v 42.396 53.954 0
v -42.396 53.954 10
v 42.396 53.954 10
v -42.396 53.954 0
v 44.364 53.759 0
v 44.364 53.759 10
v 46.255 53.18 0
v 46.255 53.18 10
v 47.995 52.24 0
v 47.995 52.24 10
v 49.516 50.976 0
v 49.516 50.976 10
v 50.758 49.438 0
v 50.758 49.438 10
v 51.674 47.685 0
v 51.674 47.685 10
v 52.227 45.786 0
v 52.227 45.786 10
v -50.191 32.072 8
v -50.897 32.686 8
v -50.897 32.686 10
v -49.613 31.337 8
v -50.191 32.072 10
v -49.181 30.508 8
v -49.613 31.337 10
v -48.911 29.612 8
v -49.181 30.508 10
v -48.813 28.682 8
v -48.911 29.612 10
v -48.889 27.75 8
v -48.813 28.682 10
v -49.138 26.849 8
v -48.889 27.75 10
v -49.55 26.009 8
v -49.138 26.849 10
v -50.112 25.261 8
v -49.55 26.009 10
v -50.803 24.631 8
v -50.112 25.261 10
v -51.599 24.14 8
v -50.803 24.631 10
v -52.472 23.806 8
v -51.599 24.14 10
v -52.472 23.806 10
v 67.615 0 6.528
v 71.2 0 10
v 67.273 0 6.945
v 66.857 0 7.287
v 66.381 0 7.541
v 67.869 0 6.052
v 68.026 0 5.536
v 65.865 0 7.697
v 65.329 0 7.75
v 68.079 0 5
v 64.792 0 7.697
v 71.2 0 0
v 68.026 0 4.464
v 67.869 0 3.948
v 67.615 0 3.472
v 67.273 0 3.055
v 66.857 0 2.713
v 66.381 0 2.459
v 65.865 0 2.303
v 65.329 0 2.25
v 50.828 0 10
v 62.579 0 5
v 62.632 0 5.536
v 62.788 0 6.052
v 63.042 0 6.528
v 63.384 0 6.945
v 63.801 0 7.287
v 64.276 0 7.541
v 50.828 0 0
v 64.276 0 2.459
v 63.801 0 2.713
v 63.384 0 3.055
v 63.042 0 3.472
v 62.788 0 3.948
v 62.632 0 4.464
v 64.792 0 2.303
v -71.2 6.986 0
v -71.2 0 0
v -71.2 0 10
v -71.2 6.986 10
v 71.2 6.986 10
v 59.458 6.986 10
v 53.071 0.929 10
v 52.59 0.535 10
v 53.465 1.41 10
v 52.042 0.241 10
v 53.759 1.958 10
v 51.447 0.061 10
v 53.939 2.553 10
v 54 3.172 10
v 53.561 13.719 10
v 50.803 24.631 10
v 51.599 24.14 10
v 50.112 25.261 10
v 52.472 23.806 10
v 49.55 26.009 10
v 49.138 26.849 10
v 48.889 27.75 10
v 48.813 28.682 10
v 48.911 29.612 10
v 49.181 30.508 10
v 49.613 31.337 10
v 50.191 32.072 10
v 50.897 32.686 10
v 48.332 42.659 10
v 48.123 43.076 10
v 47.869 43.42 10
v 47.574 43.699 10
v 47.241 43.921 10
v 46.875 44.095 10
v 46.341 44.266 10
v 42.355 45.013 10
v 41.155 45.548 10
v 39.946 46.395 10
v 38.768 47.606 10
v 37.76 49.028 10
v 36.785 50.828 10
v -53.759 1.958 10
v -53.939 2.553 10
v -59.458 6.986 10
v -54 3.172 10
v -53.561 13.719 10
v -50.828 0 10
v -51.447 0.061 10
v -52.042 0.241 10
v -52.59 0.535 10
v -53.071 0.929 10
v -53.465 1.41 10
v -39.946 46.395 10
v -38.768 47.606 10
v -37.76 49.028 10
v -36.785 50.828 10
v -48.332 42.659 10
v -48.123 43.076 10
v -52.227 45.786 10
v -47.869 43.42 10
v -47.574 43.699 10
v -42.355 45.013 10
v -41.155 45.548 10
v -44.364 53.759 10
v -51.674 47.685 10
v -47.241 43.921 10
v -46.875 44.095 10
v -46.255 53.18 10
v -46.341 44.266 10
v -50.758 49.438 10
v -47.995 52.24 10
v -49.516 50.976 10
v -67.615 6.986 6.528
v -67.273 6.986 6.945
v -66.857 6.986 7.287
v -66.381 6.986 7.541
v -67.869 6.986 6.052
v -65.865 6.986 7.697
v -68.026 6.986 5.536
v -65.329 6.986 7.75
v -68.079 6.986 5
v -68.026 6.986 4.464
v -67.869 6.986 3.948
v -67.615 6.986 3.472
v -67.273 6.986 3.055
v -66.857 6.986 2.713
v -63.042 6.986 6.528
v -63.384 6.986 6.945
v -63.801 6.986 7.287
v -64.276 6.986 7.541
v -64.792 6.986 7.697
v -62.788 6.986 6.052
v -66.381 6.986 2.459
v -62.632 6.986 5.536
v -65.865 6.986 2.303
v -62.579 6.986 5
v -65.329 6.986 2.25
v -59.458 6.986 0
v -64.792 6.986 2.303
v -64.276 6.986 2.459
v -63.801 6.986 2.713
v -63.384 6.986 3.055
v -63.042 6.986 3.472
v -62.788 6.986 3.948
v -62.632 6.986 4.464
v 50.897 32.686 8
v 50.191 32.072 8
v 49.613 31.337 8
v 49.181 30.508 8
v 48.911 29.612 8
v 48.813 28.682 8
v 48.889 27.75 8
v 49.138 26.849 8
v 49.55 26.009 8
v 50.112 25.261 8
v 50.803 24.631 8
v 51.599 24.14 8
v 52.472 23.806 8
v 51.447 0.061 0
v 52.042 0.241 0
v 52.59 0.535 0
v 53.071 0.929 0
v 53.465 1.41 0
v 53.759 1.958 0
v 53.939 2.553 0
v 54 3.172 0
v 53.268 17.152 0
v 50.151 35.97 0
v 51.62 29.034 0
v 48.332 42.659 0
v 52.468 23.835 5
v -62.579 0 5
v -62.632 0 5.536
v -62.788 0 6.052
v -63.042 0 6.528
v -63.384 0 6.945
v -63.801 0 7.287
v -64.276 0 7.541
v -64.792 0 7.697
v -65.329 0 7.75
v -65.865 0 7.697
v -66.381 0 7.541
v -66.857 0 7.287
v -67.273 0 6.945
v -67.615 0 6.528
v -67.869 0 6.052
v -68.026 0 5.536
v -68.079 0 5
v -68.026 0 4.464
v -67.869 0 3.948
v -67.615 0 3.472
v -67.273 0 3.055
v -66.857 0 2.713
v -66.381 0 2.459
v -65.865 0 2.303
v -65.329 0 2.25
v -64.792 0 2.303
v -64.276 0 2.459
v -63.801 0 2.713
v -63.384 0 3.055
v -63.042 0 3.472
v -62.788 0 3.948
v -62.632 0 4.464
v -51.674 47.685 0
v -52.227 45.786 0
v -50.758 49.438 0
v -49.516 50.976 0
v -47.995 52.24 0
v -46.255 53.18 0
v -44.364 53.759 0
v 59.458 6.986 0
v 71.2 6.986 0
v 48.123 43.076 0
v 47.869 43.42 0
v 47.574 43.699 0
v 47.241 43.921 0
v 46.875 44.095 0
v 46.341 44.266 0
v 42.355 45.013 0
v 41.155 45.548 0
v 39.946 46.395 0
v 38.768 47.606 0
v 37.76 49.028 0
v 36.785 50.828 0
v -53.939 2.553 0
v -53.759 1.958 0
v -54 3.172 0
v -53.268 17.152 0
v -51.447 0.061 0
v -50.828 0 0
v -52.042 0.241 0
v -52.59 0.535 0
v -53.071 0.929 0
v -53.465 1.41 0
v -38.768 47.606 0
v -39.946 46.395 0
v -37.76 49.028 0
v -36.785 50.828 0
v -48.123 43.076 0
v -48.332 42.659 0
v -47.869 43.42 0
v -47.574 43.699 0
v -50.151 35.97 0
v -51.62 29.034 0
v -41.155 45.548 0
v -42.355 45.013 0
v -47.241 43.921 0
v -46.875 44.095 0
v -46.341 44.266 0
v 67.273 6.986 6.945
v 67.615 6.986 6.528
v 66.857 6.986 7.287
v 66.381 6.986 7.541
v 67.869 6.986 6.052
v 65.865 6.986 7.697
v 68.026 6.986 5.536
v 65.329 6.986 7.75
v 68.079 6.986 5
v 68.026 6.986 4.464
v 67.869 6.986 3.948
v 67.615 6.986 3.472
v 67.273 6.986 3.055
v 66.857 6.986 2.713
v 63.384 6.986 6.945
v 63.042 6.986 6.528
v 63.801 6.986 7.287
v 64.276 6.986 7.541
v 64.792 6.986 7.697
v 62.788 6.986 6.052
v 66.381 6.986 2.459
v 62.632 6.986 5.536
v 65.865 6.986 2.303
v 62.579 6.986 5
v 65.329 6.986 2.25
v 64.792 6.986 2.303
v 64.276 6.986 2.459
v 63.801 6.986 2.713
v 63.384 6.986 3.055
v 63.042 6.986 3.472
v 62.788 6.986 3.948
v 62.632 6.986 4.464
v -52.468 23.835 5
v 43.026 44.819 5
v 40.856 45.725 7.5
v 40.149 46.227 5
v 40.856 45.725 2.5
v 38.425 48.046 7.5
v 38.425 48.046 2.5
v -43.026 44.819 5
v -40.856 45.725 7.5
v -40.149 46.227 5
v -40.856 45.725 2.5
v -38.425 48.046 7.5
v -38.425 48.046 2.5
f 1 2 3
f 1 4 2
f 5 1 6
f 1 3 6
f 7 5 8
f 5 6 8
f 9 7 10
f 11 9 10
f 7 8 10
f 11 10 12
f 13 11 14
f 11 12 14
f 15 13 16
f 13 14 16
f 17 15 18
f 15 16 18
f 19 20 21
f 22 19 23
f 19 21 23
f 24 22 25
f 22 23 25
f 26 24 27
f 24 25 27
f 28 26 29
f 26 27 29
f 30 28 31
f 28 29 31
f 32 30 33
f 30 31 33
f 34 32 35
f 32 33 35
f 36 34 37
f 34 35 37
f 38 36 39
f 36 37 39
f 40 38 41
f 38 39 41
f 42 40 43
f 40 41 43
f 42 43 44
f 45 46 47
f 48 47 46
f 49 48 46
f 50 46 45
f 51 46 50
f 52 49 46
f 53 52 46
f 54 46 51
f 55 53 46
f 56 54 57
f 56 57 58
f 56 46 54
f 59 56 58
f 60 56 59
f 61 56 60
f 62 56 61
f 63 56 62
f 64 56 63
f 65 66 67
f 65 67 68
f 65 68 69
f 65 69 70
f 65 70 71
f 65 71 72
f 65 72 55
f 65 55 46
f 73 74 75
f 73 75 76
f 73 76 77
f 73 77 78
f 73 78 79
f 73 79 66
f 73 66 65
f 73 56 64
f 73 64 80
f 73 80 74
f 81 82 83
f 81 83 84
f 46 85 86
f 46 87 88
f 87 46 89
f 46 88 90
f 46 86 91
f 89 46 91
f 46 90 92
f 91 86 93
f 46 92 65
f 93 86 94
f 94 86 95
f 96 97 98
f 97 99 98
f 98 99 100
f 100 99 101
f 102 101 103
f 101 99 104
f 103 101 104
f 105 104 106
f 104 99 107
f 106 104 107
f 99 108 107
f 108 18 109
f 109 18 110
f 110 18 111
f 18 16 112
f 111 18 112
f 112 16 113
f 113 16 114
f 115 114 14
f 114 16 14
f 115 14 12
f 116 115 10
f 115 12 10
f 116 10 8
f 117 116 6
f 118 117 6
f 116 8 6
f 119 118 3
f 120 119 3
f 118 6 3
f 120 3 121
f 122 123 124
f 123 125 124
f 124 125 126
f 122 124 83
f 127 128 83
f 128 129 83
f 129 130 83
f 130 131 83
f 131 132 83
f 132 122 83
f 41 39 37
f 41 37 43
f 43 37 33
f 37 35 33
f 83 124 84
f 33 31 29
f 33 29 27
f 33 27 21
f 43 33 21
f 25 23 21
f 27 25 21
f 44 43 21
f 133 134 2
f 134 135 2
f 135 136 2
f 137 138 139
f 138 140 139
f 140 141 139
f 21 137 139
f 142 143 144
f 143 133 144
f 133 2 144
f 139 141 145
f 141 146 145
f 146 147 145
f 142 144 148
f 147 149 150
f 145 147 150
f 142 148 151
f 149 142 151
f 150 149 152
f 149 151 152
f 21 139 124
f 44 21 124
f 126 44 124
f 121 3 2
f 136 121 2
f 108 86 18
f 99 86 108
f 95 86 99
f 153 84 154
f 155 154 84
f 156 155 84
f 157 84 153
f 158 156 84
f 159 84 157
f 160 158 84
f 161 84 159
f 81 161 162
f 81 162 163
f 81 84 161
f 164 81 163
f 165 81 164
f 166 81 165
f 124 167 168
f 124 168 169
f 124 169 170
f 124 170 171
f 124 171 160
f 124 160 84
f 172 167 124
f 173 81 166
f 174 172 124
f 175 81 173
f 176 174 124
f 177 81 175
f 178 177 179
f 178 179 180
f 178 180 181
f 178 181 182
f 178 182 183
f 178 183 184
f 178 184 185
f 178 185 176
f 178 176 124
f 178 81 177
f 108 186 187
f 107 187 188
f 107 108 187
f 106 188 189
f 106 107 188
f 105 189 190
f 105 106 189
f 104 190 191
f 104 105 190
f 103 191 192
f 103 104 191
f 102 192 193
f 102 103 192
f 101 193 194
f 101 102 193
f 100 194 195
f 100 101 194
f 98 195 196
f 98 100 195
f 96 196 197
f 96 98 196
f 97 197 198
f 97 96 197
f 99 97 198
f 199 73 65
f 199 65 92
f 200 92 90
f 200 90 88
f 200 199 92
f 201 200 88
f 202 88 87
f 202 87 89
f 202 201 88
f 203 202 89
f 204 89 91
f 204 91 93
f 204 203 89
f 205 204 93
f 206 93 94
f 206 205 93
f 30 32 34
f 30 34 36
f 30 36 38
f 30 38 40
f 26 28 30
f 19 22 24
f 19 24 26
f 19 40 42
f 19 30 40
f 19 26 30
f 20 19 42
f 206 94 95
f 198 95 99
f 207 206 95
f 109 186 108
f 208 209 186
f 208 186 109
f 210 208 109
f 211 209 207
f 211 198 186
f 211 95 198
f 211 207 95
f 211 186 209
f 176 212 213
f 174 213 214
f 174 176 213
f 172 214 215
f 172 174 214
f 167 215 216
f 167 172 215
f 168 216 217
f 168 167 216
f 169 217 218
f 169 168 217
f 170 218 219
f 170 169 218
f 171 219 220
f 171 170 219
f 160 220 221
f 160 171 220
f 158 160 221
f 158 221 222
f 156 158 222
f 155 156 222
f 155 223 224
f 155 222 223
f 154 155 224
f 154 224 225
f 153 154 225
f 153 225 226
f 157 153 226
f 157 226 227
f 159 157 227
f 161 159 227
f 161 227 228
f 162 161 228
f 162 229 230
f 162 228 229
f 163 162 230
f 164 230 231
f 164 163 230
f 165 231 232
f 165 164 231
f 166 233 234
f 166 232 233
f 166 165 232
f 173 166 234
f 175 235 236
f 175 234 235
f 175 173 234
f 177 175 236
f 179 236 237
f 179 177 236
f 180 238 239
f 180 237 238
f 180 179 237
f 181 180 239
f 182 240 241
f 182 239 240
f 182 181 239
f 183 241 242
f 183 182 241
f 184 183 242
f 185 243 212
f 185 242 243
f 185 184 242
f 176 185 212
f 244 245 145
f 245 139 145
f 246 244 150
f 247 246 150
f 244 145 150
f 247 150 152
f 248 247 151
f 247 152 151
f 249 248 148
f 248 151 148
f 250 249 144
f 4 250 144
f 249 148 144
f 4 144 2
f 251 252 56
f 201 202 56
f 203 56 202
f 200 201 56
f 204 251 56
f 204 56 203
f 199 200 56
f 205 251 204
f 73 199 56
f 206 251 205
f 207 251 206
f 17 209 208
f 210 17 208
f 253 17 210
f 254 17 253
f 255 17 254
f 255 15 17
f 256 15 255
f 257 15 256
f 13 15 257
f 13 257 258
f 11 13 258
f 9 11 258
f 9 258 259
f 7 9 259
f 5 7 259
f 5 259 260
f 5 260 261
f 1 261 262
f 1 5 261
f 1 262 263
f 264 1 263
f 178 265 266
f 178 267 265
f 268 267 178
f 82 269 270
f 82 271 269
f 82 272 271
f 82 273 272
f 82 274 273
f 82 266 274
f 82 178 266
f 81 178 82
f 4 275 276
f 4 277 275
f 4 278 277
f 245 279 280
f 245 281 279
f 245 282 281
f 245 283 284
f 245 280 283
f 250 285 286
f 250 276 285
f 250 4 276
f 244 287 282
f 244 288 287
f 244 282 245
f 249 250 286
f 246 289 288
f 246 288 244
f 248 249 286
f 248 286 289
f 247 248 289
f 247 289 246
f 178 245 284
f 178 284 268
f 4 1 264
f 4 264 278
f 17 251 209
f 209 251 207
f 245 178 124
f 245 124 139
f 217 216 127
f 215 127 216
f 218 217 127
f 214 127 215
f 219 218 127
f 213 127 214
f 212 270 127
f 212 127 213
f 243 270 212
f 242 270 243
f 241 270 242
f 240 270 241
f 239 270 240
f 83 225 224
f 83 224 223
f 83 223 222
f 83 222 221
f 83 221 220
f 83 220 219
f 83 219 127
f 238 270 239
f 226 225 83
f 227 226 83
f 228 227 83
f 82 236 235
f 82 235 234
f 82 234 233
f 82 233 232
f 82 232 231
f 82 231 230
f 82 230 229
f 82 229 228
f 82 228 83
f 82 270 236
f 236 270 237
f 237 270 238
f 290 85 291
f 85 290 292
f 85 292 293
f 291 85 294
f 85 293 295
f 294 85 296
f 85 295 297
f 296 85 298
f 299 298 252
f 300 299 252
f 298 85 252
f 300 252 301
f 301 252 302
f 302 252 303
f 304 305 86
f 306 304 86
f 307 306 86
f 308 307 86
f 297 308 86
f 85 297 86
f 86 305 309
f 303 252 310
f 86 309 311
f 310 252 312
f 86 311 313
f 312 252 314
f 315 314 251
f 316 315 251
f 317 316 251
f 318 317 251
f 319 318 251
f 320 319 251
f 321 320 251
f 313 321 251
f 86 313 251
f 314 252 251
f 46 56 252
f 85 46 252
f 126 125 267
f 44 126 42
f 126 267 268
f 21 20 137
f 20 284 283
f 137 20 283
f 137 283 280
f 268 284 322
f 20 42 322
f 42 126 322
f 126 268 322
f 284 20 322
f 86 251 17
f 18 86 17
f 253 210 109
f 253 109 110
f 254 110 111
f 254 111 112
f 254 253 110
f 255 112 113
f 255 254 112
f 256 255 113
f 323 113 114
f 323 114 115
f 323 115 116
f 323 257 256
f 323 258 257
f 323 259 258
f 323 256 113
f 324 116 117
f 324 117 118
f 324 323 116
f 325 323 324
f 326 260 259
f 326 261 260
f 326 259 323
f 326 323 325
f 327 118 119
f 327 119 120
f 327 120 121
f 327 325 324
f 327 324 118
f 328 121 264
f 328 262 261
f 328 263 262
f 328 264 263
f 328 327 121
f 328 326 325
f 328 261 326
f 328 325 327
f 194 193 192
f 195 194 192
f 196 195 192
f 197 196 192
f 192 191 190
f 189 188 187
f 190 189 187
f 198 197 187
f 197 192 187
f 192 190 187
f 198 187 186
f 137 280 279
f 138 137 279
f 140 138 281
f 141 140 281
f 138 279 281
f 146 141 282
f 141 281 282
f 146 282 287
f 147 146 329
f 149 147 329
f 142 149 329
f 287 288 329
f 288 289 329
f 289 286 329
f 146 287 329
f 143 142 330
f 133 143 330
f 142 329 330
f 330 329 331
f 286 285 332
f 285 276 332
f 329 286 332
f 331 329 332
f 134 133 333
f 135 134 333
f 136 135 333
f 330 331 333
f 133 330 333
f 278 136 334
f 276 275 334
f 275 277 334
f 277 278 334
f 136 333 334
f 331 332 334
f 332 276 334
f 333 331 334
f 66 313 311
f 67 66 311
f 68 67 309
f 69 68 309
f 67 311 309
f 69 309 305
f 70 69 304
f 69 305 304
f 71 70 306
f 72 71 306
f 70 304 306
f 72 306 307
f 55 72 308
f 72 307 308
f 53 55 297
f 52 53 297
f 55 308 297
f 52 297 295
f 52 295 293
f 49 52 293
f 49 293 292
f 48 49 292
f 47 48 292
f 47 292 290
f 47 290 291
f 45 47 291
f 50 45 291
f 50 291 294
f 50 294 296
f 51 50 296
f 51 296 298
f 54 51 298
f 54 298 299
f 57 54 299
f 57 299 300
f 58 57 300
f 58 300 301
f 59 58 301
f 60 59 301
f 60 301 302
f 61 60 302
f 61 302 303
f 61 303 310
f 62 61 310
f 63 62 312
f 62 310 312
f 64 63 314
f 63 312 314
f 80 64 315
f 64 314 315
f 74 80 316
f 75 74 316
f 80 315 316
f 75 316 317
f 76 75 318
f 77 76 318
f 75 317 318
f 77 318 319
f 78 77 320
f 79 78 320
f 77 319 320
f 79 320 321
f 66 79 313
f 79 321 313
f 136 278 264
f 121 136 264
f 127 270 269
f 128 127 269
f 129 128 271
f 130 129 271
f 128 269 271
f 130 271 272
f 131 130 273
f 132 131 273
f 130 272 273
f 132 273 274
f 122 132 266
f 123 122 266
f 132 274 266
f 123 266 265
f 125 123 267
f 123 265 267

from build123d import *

# Parameters (mm, degrees)
PAD_DEPTH    = 10
POCKET_DEPTH = 2
PAD001_DEPTH = 10
SKETCH002_R  = 2.75
HOLE_DEPTH   = 186.769494
FILLET_R     = 10


with BuildPart() as body:
    # Sketch → Pad (new body)
    with BuildSketch(Plane.XY):
        with BuildLine():
            ThreePointArc((50.827684, 0), (53.07085, 0.92915), (54, 3.172316))
            add(Edge.make_bspline(
                [(54, 3.172316), (53.770463, 24.754659), (48.332207, 42.658529)],
                knots=[0, 0, 0, 1, 1, 1], degree=2))
            add(Edge.make_bspline(
                [(48.332207, 42.658529), (47.508229, 44.694932), (42.952807, 43.870954), (38.691662, 46.837275), (36.784741, 50.827684)],
                knots=[0, 0, 0, 0, 0.5, 1, 1, 1, 1], degree=3))
            Line((36.784741, 50.827684), (0, 50.827684))
            Line((0, 50.827684), (0, 0))
            Line((0, 0), (50.827684, 0))
        make_face()
    pad = extrude(amount=PAD_DEPTH)

    # Mirrored: Pad across Sketch V_Axis
    add(pad.mirror(Plane(origin=(0, 0, 0), x_dir=(0, 0, 1), z_dir=(1, 0, 0))))

    # Sketch003 (on Face13 of Cut) → Pocket (cut)
    with BuildSketch(Plane.XY.offset(10)):
        with BuildLine():
            ThreePointArc((53.812202, 33.623601), (48.812202, 28.623601), (53.812202, 23.623601))
            Line((53.812202, 23.623601), (53.812202, 33.623601))
        make_face()
    pocket = extrude(amount=-POCKET_DEPTH, mode=Mode.SUBTRACT)

    # Mirrored003: Pocket across Sketch003 V_Axis
    add(pocket.mirror(Plane(origin=(0, 0, 10), x_dir=(0, 0, 1), z_dir=(1, 0, 0))), mode=Mode.SUBTRACT)


with BuildPart() as cut:
    # Sketch001 → Pad001 (new body)
    with BuildSketch(Plane.XY):
        Polygon((0, 0), (71.199806, 0), (71.199806, 6.985645), (59.457661, 6.985645), (50.704418, 53.954201), (0, 53.954201), align=None)
    pad001 = extrude(amount=PAD001_DEPTH)

    # Sketch002 (on Face3 of Pad001) → Hole (cut, through all)
    with BuildSketch(Plane(origin=(0, 6.985645, 0), x_dir=(-1, 0, 0), z_dir=(0, 1, 0))):
        with Locations((-65.328733, 5)):
            Circle(SKETCH002_R)
    hole = extrude(amount=-HOLE_DEPTH, mode=Mode.SUBTRACT)

    # Mirrored001: Pad001 across Sketch001 V_Axis
    add(pad001.mirror(Plane(origin=(0, 0, 0), x_dir=(0, 0, 1), z_dir=(1, 0, 0))))

    # Mirrored002: Hole across Sketch002 V_Axis
    add(hole.mirror(Plane(origin=(0, 6.985645, 0), x_dir=(0, 1, 0), z_dir=(-1, 0, 0))), mode=Mode.SUBTRACT)

    # Fillet
    fillet_edges = [cut.edges().sort_by_distance(p)[0] for p in [
        (50.704418, 53.954201, 5),
        (-50.704418, 53.954201, 5),
    ]]
    fillet(fillet_edges, radius=FILLET_R)

    # Cut: cut Body
    add(body.part, mode=Mode.SUBTRACT)


solid = cut.part
